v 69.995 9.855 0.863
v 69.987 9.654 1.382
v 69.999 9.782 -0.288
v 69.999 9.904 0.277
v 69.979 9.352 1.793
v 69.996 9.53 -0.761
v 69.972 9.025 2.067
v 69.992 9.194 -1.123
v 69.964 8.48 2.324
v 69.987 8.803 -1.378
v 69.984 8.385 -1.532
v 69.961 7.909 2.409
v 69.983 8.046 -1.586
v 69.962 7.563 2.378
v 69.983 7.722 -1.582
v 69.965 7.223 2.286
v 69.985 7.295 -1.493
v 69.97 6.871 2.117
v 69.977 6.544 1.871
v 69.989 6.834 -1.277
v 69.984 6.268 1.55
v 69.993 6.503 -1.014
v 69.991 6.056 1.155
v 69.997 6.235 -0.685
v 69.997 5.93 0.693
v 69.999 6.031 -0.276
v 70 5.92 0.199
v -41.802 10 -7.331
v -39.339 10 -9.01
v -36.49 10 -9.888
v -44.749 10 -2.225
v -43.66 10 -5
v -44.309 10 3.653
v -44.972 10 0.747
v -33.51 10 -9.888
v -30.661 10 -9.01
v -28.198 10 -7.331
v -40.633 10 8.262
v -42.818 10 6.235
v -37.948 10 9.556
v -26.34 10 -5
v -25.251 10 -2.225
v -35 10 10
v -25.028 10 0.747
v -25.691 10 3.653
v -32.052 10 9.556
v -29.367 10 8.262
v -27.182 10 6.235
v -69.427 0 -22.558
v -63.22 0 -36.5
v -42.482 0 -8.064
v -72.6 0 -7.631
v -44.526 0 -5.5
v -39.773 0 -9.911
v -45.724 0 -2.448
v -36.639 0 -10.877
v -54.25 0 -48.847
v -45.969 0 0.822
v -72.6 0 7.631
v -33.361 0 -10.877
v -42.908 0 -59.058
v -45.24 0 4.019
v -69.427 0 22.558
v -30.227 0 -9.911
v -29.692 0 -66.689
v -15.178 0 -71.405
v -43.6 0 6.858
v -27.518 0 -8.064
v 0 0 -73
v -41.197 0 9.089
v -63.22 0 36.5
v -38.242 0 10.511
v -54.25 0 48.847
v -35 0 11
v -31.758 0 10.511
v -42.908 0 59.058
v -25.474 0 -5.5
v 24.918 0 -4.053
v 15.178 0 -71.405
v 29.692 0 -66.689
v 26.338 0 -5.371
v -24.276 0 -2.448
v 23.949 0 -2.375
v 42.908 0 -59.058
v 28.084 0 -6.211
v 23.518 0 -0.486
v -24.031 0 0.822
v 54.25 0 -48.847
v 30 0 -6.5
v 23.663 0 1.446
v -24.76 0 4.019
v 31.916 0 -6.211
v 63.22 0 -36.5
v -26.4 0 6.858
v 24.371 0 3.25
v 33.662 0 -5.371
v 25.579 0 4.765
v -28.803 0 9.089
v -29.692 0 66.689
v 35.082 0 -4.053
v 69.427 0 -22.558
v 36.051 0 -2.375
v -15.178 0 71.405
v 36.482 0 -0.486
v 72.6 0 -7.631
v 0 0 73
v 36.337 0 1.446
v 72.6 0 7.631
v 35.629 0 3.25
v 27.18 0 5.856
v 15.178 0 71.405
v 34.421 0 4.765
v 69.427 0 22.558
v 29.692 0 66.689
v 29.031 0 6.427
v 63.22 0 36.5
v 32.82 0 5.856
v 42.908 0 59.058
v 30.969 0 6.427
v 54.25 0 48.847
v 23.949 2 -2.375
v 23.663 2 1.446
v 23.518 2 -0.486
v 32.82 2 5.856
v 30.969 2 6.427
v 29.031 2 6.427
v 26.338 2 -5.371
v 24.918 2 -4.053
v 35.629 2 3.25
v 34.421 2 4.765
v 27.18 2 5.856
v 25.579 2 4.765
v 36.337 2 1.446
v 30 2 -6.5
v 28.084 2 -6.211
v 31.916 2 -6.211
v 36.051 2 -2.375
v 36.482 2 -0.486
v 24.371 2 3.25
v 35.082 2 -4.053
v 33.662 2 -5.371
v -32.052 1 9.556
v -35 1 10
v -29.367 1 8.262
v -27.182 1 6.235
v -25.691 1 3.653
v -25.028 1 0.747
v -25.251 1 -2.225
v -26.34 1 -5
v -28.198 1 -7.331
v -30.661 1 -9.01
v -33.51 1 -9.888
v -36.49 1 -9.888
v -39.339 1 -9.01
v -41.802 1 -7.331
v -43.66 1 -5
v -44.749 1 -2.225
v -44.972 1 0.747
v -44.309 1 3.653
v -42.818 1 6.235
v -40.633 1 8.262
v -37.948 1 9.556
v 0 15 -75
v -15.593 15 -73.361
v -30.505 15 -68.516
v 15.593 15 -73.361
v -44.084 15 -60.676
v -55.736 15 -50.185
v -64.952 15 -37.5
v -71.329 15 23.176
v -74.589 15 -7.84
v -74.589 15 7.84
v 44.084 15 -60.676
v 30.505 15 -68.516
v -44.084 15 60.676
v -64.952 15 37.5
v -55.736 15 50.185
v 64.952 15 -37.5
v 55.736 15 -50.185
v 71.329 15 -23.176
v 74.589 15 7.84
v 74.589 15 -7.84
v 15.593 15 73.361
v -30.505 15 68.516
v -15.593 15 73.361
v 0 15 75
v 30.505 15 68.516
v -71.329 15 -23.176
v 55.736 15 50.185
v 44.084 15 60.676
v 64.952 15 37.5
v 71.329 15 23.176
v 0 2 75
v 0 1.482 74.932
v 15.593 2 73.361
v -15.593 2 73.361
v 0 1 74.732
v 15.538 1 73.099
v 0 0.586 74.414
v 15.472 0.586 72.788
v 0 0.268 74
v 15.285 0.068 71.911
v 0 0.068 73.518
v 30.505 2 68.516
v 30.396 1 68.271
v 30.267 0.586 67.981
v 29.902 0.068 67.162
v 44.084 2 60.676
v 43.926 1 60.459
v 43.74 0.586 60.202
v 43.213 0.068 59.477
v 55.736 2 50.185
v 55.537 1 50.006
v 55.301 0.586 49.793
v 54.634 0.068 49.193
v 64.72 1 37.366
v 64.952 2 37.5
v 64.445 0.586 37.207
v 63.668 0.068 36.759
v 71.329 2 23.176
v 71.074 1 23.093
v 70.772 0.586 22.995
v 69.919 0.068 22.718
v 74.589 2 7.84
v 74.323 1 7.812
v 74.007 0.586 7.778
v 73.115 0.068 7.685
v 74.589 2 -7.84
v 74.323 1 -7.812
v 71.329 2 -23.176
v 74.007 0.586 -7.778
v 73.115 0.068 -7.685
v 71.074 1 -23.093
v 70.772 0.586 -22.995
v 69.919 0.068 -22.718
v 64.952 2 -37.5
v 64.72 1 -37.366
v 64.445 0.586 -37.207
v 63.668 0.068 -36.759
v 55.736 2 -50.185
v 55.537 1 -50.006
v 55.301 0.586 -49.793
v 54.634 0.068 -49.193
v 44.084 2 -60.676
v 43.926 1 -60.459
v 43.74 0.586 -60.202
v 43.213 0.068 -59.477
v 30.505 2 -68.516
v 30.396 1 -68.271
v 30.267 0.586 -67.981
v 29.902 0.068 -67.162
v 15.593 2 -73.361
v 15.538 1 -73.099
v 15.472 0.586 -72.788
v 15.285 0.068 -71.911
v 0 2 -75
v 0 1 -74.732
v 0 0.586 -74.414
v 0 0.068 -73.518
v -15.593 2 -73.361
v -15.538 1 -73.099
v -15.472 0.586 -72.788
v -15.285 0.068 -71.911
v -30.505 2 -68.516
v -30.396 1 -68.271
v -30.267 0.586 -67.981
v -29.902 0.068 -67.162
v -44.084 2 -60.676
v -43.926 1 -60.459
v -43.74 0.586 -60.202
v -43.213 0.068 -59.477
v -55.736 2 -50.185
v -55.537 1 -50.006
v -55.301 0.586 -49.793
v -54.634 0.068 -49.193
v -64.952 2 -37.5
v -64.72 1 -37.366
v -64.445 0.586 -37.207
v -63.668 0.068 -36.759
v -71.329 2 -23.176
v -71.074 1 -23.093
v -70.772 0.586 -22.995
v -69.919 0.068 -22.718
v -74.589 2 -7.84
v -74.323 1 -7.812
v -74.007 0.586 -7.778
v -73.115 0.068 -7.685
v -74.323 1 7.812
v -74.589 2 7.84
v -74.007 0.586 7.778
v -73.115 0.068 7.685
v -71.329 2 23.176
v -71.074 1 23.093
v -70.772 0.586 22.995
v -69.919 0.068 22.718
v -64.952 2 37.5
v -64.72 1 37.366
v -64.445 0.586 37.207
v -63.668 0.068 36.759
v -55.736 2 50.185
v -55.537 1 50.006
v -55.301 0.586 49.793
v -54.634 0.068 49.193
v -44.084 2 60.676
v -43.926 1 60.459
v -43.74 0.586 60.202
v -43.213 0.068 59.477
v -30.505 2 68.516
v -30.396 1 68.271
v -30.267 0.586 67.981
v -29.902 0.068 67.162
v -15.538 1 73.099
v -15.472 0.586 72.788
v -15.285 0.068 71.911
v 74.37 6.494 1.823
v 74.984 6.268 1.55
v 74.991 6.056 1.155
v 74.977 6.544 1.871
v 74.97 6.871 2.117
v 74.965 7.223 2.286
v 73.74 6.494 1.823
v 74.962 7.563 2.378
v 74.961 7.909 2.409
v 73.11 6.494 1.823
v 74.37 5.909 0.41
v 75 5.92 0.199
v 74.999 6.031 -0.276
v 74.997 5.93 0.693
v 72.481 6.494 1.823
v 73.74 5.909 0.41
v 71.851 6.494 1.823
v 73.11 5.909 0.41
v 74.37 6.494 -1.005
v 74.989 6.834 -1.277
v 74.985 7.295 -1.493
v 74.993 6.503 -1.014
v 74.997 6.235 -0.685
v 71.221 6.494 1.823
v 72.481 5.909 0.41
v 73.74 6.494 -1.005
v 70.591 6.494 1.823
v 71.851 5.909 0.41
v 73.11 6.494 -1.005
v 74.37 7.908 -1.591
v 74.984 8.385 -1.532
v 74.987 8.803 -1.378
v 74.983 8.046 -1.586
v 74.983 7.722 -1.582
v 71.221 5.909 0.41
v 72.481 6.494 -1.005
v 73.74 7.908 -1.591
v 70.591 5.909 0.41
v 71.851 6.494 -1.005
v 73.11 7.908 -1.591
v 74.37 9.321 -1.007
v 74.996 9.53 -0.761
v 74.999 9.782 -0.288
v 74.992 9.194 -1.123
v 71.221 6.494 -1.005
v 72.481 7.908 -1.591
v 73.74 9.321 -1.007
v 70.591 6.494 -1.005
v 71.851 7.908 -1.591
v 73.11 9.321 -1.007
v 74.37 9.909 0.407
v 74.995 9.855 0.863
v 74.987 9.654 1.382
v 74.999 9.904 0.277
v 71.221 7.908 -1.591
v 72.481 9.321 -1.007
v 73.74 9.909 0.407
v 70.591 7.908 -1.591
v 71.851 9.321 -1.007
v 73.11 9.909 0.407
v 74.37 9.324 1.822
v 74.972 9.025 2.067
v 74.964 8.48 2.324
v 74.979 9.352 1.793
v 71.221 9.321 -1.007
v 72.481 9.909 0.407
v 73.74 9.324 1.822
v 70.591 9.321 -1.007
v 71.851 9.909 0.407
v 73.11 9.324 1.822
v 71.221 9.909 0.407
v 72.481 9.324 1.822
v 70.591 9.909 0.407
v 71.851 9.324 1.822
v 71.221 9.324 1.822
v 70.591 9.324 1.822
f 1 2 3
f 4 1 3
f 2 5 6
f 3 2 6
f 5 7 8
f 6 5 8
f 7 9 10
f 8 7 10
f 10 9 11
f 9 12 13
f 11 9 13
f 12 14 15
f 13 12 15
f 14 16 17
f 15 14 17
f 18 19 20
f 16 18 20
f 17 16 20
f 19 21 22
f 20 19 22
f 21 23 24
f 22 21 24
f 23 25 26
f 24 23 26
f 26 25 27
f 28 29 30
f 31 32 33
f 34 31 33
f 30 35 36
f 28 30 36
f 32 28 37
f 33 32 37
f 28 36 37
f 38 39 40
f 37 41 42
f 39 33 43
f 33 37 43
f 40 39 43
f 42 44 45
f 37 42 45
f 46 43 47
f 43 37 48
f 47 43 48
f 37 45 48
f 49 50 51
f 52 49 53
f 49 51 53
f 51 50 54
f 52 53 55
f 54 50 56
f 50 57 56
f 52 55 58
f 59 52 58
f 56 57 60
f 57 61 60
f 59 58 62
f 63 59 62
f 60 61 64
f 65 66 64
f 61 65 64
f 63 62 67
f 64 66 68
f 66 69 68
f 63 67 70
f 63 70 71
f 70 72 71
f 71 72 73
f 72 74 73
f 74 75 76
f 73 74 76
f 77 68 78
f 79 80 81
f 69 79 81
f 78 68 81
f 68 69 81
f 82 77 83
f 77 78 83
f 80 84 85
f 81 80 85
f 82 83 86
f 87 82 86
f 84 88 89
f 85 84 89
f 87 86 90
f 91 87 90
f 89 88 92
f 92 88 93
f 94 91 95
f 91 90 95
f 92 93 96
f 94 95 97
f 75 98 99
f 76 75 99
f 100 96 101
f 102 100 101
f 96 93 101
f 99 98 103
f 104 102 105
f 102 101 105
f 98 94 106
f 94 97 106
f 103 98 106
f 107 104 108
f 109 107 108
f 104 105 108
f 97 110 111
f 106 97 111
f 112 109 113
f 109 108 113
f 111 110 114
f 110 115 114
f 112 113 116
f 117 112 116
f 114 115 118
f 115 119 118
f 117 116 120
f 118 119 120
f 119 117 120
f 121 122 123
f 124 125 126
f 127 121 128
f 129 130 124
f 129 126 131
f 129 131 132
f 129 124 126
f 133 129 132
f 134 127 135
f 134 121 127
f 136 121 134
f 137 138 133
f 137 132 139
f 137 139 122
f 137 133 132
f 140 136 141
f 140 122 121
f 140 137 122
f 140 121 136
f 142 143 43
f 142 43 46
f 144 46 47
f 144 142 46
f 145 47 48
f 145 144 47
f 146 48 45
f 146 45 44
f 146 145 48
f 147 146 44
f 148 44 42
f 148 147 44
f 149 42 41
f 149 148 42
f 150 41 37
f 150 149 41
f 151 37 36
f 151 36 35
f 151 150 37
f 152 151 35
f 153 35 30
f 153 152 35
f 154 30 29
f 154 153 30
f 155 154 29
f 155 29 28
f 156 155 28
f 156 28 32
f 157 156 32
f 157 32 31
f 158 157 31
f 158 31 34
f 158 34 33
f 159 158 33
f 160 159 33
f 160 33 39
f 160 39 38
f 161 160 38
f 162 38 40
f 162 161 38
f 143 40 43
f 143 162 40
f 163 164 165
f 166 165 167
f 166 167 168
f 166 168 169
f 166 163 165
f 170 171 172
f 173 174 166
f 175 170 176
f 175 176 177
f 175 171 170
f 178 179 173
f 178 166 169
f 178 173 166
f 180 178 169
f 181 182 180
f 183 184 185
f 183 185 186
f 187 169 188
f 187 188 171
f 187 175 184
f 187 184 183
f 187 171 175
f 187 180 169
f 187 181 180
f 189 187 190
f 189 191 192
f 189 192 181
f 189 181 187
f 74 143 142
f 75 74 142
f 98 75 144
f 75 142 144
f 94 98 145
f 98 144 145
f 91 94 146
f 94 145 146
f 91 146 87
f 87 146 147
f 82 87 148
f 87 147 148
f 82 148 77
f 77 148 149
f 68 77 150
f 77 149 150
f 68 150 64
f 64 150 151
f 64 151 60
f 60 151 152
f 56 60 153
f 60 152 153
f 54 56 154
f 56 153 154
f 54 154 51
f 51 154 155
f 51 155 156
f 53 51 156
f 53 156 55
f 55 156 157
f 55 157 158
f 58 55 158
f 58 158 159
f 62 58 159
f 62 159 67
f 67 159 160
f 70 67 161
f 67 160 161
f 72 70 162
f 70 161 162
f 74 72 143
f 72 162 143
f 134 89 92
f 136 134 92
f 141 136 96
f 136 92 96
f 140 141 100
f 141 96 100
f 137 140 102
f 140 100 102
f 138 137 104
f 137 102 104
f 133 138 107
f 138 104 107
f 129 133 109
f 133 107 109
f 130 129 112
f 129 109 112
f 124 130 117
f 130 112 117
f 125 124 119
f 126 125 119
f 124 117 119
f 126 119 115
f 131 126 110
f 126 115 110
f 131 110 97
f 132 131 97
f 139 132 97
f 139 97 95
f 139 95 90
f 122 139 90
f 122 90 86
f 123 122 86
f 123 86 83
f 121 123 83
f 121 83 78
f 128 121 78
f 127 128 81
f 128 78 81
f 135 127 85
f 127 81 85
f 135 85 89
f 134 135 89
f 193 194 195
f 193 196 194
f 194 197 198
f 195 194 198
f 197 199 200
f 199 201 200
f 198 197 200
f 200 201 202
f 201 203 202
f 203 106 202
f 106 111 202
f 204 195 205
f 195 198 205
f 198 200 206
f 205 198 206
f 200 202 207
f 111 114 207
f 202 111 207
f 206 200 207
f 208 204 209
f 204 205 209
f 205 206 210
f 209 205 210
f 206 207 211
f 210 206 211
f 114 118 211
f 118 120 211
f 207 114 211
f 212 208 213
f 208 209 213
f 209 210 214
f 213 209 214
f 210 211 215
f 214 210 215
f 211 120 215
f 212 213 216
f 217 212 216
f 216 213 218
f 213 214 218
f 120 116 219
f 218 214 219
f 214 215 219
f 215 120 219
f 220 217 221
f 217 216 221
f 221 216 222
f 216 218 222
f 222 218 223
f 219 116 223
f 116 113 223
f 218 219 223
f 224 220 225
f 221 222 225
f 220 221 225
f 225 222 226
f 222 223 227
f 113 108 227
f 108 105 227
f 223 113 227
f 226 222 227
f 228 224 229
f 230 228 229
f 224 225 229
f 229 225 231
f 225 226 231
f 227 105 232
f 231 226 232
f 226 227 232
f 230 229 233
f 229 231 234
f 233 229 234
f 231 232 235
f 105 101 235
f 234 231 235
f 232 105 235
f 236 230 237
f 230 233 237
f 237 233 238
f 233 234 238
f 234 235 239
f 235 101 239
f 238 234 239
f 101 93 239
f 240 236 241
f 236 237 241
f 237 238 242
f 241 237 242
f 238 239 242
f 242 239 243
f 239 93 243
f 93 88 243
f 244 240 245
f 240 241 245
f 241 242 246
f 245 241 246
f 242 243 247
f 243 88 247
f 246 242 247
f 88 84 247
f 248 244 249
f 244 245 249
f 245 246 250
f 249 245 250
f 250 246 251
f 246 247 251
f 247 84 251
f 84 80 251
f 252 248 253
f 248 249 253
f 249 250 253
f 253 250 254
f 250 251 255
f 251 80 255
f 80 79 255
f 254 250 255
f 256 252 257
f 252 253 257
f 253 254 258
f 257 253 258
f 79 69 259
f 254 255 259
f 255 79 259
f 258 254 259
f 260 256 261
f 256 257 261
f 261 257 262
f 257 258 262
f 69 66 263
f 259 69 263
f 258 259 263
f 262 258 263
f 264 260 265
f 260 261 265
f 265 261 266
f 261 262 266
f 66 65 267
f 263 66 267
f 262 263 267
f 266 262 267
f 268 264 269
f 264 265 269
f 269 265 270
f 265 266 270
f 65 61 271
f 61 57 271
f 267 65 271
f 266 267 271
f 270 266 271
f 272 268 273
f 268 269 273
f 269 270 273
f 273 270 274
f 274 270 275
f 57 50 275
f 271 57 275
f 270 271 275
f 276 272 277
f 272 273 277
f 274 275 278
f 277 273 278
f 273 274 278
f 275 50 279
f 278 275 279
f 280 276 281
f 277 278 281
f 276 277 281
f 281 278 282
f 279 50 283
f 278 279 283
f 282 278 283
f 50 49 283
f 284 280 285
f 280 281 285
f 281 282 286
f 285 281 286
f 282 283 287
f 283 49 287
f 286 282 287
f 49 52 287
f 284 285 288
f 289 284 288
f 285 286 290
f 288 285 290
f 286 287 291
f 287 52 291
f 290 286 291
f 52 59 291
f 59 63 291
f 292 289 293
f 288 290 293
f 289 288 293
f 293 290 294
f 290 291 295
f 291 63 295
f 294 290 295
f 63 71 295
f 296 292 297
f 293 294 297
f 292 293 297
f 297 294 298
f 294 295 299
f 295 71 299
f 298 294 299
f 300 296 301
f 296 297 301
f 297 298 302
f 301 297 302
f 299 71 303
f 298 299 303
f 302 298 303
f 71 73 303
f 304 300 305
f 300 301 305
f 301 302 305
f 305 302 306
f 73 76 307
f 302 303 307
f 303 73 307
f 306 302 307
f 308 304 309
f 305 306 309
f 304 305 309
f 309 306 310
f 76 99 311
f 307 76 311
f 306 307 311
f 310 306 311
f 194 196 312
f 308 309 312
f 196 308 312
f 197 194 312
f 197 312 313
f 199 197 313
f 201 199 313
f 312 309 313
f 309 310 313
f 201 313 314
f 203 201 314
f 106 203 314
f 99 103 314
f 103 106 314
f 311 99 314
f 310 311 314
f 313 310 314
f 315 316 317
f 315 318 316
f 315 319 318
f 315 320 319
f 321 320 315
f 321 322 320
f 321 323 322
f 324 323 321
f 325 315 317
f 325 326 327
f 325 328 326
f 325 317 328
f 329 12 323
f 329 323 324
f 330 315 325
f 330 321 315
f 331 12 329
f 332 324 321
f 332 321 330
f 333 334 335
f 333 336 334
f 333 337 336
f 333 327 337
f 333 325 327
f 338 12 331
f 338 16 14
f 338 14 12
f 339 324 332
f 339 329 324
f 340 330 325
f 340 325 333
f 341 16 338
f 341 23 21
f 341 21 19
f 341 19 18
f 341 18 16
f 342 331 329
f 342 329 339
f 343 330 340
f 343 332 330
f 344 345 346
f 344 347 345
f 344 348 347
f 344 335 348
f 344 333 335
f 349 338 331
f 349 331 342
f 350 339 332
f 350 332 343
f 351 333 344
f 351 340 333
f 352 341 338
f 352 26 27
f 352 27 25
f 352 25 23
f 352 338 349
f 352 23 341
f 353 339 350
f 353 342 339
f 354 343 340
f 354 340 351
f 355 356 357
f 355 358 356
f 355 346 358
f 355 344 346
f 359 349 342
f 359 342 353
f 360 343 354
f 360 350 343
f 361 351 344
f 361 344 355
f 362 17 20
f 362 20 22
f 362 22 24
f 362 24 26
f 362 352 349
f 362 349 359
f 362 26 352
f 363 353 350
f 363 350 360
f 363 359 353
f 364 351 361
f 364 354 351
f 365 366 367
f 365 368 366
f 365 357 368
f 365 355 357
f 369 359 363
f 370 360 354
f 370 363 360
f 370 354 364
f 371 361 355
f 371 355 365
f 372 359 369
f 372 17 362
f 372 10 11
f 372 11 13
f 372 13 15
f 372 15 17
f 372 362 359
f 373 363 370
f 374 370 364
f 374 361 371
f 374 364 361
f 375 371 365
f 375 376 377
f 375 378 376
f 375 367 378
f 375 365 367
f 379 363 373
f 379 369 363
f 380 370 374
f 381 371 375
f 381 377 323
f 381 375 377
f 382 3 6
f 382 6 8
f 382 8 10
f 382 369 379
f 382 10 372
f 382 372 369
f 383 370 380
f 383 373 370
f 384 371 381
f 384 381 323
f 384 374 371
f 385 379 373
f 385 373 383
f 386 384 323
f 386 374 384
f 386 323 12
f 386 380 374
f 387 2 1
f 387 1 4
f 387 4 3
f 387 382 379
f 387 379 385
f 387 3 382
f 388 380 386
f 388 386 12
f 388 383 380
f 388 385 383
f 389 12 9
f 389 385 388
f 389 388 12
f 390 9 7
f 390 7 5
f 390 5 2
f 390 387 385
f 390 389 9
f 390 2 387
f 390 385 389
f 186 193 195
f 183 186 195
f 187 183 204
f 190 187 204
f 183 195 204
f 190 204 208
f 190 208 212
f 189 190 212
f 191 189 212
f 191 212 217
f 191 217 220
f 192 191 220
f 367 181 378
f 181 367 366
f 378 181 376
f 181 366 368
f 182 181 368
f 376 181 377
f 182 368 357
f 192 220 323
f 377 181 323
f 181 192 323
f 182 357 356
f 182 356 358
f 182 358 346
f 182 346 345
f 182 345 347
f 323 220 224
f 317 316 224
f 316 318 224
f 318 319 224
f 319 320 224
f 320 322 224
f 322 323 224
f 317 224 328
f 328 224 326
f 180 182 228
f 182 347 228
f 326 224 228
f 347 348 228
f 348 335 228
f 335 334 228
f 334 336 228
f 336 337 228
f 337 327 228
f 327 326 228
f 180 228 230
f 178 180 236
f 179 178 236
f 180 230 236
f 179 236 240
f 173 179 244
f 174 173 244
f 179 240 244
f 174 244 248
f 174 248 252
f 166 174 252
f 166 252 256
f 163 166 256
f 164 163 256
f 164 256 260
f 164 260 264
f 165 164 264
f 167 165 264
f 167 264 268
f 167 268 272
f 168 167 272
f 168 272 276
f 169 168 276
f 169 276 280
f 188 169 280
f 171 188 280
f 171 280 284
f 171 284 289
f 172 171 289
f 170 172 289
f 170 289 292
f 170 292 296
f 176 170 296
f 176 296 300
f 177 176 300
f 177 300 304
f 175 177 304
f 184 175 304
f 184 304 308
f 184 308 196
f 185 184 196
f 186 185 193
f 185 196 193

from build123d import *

# Parameters (mm, degrees)
SKETCH_1_R            = 75
EXTRUDE_1_DEPTH       = 15
SKETCH_2_R            = 10
CUT_EXTRUDE_2_DEPTH   = 10
FILLET_1_R            = 2
CHAMFER_1_SIZE        = 1
SKETCH_3_R            = 6.5
CUT_EXTRUDE_3_DEPTH   = 2
CUT_EXTRUDE_START     = 69.96131425
CUT_EXTRUDE_9_DEPTH   = 6.03868575
CUT_EXTRUDE_START_2   = 5
CUT_EXTRUDE_9_2_DEPTH = 6


with BuildPart() as part:
    # 草图1 → 凸台-拉伸1 (new body)
    with BuildSketch(Plane(origin=(0, 0, 0), x_dir=(1, 0, 0), z_dir=(0, 1, 0))):
        with Locations(Location((0, 0, 0), (0, 0, 270))):
            Circle(SKETCH_1_R)
    extrude(amount=EXTRUDE_1_DEPTH)

    # 草图2 → 切除-拉伸2 (cut)
    with BuildSketch(Plane(origin=(0, 0, 0), x_dir=(1, 0, 0), z_dir=(0, 1, 0))):
        with Locations(Location((-35, 0, 0), (0, 0, 270))):
            Circle(SKETCH_2_R)
    extrude(amount=CUT_EXTRUDE_2_DEPTH, mode=Mode.SUBTRACT)

    # 圆角1
    fillet_1_edges = [part.edges().sort_by_distance(p)[0] for p in [
        (0, 0, -75),
    ]]
    fillet(fillet_1_edges, radius=FILLET_1_R)

    # 倒角1
    chamfer_1_edges = [part.edges().sort_by_distance(p)[0] for p in [
        (-35, 0, -10),
    ]]
    chamfer(chamfer_1_edges, length=CHAMFER_1_SIZE)

    # 草图3 → 切除-拉伸3 (cut)
    with BuildSketch(Plane.XZ):
        with Locations(Location((30, 0, 0), (0, 0, 270))):
            Circle(SKETCH_3_R)
    extrude(amount=-CUT_EXTRUDE_3_DEPTH, mode=Mode.SUBTRACT)

    # 切除-拉伸9: read off the stored shape, not the designer's step
    # 切除-拉伸9 outline → 切除-拉伸9 (cut)
    with BuildSketch(Plane(origin=(0, 0, 0), x_dir=(0, 0, -1), z_dir=(1, 0, 0)).offset(CUT_EXTRUDE_START)):
        with BuildLine():
            add(Edge.make_bspline(
                [(-2.408599358, 7.908599358), (-2.408599358, 7.380050553), (-2.19172637, 6.863241712), (-1.453678928, 6.125309354), (-0.931504849, 5.908902276), (0.111986372, 5.908297113), (0.631291702, 6.120458395), (1.378441313, 6.866818593), (1.591215997, 7.385801707), (1.591585037, 8.429983307), (1.375428682, 8.952297025), (0.638483078, 9.690642916), (0.120902782, 9.908088408), (-0.93423459, 9.909108439), (-1.452163157, 9.692883252), (-2.191245952, 8.954957584), (-2.408599358, 8.437148163), (-2.408599358, 7.908599358)],
                knots=[0, 0, 0, 0, 0.125, 0.125, 0.25, 0.25, 0.375, 0.375, 0.5, 0.5, 0.625, 0.625, 0.75, 0.75, 0.875, 0.875, 1, 1, 1, 1], degree=3))
        make_face()
    extrude(amount=CUT_EXTRUDE_9_DEPTH, mode=Mode.SUBTRACT)

    # Cut-Extrude 9 2 outline → Cut-Extrude 9 2 (add)
    with BuildSketch(Plane(origin=(0, 0, 0), x_dir=(1, 0, 0), z_dir=(0, 1, 0)).offset(CUT_EXTRUDE_START_2)):
        with BuildLine():
            ThreePointArc((69.96131435, -2.408599358), (69.998905417, -0.405199028), (69.982963585, 1.598490525))
            Line((69.982963585, 1.598490525), (69.96131425, 2.614030645))
            Line((69.96131425, 2.614030645), (69.96131435, -2.408599358))
        make_face()
    extrude(amount=CUT_EXTRUDE_9_2_DEPTH)


solid = part.part
